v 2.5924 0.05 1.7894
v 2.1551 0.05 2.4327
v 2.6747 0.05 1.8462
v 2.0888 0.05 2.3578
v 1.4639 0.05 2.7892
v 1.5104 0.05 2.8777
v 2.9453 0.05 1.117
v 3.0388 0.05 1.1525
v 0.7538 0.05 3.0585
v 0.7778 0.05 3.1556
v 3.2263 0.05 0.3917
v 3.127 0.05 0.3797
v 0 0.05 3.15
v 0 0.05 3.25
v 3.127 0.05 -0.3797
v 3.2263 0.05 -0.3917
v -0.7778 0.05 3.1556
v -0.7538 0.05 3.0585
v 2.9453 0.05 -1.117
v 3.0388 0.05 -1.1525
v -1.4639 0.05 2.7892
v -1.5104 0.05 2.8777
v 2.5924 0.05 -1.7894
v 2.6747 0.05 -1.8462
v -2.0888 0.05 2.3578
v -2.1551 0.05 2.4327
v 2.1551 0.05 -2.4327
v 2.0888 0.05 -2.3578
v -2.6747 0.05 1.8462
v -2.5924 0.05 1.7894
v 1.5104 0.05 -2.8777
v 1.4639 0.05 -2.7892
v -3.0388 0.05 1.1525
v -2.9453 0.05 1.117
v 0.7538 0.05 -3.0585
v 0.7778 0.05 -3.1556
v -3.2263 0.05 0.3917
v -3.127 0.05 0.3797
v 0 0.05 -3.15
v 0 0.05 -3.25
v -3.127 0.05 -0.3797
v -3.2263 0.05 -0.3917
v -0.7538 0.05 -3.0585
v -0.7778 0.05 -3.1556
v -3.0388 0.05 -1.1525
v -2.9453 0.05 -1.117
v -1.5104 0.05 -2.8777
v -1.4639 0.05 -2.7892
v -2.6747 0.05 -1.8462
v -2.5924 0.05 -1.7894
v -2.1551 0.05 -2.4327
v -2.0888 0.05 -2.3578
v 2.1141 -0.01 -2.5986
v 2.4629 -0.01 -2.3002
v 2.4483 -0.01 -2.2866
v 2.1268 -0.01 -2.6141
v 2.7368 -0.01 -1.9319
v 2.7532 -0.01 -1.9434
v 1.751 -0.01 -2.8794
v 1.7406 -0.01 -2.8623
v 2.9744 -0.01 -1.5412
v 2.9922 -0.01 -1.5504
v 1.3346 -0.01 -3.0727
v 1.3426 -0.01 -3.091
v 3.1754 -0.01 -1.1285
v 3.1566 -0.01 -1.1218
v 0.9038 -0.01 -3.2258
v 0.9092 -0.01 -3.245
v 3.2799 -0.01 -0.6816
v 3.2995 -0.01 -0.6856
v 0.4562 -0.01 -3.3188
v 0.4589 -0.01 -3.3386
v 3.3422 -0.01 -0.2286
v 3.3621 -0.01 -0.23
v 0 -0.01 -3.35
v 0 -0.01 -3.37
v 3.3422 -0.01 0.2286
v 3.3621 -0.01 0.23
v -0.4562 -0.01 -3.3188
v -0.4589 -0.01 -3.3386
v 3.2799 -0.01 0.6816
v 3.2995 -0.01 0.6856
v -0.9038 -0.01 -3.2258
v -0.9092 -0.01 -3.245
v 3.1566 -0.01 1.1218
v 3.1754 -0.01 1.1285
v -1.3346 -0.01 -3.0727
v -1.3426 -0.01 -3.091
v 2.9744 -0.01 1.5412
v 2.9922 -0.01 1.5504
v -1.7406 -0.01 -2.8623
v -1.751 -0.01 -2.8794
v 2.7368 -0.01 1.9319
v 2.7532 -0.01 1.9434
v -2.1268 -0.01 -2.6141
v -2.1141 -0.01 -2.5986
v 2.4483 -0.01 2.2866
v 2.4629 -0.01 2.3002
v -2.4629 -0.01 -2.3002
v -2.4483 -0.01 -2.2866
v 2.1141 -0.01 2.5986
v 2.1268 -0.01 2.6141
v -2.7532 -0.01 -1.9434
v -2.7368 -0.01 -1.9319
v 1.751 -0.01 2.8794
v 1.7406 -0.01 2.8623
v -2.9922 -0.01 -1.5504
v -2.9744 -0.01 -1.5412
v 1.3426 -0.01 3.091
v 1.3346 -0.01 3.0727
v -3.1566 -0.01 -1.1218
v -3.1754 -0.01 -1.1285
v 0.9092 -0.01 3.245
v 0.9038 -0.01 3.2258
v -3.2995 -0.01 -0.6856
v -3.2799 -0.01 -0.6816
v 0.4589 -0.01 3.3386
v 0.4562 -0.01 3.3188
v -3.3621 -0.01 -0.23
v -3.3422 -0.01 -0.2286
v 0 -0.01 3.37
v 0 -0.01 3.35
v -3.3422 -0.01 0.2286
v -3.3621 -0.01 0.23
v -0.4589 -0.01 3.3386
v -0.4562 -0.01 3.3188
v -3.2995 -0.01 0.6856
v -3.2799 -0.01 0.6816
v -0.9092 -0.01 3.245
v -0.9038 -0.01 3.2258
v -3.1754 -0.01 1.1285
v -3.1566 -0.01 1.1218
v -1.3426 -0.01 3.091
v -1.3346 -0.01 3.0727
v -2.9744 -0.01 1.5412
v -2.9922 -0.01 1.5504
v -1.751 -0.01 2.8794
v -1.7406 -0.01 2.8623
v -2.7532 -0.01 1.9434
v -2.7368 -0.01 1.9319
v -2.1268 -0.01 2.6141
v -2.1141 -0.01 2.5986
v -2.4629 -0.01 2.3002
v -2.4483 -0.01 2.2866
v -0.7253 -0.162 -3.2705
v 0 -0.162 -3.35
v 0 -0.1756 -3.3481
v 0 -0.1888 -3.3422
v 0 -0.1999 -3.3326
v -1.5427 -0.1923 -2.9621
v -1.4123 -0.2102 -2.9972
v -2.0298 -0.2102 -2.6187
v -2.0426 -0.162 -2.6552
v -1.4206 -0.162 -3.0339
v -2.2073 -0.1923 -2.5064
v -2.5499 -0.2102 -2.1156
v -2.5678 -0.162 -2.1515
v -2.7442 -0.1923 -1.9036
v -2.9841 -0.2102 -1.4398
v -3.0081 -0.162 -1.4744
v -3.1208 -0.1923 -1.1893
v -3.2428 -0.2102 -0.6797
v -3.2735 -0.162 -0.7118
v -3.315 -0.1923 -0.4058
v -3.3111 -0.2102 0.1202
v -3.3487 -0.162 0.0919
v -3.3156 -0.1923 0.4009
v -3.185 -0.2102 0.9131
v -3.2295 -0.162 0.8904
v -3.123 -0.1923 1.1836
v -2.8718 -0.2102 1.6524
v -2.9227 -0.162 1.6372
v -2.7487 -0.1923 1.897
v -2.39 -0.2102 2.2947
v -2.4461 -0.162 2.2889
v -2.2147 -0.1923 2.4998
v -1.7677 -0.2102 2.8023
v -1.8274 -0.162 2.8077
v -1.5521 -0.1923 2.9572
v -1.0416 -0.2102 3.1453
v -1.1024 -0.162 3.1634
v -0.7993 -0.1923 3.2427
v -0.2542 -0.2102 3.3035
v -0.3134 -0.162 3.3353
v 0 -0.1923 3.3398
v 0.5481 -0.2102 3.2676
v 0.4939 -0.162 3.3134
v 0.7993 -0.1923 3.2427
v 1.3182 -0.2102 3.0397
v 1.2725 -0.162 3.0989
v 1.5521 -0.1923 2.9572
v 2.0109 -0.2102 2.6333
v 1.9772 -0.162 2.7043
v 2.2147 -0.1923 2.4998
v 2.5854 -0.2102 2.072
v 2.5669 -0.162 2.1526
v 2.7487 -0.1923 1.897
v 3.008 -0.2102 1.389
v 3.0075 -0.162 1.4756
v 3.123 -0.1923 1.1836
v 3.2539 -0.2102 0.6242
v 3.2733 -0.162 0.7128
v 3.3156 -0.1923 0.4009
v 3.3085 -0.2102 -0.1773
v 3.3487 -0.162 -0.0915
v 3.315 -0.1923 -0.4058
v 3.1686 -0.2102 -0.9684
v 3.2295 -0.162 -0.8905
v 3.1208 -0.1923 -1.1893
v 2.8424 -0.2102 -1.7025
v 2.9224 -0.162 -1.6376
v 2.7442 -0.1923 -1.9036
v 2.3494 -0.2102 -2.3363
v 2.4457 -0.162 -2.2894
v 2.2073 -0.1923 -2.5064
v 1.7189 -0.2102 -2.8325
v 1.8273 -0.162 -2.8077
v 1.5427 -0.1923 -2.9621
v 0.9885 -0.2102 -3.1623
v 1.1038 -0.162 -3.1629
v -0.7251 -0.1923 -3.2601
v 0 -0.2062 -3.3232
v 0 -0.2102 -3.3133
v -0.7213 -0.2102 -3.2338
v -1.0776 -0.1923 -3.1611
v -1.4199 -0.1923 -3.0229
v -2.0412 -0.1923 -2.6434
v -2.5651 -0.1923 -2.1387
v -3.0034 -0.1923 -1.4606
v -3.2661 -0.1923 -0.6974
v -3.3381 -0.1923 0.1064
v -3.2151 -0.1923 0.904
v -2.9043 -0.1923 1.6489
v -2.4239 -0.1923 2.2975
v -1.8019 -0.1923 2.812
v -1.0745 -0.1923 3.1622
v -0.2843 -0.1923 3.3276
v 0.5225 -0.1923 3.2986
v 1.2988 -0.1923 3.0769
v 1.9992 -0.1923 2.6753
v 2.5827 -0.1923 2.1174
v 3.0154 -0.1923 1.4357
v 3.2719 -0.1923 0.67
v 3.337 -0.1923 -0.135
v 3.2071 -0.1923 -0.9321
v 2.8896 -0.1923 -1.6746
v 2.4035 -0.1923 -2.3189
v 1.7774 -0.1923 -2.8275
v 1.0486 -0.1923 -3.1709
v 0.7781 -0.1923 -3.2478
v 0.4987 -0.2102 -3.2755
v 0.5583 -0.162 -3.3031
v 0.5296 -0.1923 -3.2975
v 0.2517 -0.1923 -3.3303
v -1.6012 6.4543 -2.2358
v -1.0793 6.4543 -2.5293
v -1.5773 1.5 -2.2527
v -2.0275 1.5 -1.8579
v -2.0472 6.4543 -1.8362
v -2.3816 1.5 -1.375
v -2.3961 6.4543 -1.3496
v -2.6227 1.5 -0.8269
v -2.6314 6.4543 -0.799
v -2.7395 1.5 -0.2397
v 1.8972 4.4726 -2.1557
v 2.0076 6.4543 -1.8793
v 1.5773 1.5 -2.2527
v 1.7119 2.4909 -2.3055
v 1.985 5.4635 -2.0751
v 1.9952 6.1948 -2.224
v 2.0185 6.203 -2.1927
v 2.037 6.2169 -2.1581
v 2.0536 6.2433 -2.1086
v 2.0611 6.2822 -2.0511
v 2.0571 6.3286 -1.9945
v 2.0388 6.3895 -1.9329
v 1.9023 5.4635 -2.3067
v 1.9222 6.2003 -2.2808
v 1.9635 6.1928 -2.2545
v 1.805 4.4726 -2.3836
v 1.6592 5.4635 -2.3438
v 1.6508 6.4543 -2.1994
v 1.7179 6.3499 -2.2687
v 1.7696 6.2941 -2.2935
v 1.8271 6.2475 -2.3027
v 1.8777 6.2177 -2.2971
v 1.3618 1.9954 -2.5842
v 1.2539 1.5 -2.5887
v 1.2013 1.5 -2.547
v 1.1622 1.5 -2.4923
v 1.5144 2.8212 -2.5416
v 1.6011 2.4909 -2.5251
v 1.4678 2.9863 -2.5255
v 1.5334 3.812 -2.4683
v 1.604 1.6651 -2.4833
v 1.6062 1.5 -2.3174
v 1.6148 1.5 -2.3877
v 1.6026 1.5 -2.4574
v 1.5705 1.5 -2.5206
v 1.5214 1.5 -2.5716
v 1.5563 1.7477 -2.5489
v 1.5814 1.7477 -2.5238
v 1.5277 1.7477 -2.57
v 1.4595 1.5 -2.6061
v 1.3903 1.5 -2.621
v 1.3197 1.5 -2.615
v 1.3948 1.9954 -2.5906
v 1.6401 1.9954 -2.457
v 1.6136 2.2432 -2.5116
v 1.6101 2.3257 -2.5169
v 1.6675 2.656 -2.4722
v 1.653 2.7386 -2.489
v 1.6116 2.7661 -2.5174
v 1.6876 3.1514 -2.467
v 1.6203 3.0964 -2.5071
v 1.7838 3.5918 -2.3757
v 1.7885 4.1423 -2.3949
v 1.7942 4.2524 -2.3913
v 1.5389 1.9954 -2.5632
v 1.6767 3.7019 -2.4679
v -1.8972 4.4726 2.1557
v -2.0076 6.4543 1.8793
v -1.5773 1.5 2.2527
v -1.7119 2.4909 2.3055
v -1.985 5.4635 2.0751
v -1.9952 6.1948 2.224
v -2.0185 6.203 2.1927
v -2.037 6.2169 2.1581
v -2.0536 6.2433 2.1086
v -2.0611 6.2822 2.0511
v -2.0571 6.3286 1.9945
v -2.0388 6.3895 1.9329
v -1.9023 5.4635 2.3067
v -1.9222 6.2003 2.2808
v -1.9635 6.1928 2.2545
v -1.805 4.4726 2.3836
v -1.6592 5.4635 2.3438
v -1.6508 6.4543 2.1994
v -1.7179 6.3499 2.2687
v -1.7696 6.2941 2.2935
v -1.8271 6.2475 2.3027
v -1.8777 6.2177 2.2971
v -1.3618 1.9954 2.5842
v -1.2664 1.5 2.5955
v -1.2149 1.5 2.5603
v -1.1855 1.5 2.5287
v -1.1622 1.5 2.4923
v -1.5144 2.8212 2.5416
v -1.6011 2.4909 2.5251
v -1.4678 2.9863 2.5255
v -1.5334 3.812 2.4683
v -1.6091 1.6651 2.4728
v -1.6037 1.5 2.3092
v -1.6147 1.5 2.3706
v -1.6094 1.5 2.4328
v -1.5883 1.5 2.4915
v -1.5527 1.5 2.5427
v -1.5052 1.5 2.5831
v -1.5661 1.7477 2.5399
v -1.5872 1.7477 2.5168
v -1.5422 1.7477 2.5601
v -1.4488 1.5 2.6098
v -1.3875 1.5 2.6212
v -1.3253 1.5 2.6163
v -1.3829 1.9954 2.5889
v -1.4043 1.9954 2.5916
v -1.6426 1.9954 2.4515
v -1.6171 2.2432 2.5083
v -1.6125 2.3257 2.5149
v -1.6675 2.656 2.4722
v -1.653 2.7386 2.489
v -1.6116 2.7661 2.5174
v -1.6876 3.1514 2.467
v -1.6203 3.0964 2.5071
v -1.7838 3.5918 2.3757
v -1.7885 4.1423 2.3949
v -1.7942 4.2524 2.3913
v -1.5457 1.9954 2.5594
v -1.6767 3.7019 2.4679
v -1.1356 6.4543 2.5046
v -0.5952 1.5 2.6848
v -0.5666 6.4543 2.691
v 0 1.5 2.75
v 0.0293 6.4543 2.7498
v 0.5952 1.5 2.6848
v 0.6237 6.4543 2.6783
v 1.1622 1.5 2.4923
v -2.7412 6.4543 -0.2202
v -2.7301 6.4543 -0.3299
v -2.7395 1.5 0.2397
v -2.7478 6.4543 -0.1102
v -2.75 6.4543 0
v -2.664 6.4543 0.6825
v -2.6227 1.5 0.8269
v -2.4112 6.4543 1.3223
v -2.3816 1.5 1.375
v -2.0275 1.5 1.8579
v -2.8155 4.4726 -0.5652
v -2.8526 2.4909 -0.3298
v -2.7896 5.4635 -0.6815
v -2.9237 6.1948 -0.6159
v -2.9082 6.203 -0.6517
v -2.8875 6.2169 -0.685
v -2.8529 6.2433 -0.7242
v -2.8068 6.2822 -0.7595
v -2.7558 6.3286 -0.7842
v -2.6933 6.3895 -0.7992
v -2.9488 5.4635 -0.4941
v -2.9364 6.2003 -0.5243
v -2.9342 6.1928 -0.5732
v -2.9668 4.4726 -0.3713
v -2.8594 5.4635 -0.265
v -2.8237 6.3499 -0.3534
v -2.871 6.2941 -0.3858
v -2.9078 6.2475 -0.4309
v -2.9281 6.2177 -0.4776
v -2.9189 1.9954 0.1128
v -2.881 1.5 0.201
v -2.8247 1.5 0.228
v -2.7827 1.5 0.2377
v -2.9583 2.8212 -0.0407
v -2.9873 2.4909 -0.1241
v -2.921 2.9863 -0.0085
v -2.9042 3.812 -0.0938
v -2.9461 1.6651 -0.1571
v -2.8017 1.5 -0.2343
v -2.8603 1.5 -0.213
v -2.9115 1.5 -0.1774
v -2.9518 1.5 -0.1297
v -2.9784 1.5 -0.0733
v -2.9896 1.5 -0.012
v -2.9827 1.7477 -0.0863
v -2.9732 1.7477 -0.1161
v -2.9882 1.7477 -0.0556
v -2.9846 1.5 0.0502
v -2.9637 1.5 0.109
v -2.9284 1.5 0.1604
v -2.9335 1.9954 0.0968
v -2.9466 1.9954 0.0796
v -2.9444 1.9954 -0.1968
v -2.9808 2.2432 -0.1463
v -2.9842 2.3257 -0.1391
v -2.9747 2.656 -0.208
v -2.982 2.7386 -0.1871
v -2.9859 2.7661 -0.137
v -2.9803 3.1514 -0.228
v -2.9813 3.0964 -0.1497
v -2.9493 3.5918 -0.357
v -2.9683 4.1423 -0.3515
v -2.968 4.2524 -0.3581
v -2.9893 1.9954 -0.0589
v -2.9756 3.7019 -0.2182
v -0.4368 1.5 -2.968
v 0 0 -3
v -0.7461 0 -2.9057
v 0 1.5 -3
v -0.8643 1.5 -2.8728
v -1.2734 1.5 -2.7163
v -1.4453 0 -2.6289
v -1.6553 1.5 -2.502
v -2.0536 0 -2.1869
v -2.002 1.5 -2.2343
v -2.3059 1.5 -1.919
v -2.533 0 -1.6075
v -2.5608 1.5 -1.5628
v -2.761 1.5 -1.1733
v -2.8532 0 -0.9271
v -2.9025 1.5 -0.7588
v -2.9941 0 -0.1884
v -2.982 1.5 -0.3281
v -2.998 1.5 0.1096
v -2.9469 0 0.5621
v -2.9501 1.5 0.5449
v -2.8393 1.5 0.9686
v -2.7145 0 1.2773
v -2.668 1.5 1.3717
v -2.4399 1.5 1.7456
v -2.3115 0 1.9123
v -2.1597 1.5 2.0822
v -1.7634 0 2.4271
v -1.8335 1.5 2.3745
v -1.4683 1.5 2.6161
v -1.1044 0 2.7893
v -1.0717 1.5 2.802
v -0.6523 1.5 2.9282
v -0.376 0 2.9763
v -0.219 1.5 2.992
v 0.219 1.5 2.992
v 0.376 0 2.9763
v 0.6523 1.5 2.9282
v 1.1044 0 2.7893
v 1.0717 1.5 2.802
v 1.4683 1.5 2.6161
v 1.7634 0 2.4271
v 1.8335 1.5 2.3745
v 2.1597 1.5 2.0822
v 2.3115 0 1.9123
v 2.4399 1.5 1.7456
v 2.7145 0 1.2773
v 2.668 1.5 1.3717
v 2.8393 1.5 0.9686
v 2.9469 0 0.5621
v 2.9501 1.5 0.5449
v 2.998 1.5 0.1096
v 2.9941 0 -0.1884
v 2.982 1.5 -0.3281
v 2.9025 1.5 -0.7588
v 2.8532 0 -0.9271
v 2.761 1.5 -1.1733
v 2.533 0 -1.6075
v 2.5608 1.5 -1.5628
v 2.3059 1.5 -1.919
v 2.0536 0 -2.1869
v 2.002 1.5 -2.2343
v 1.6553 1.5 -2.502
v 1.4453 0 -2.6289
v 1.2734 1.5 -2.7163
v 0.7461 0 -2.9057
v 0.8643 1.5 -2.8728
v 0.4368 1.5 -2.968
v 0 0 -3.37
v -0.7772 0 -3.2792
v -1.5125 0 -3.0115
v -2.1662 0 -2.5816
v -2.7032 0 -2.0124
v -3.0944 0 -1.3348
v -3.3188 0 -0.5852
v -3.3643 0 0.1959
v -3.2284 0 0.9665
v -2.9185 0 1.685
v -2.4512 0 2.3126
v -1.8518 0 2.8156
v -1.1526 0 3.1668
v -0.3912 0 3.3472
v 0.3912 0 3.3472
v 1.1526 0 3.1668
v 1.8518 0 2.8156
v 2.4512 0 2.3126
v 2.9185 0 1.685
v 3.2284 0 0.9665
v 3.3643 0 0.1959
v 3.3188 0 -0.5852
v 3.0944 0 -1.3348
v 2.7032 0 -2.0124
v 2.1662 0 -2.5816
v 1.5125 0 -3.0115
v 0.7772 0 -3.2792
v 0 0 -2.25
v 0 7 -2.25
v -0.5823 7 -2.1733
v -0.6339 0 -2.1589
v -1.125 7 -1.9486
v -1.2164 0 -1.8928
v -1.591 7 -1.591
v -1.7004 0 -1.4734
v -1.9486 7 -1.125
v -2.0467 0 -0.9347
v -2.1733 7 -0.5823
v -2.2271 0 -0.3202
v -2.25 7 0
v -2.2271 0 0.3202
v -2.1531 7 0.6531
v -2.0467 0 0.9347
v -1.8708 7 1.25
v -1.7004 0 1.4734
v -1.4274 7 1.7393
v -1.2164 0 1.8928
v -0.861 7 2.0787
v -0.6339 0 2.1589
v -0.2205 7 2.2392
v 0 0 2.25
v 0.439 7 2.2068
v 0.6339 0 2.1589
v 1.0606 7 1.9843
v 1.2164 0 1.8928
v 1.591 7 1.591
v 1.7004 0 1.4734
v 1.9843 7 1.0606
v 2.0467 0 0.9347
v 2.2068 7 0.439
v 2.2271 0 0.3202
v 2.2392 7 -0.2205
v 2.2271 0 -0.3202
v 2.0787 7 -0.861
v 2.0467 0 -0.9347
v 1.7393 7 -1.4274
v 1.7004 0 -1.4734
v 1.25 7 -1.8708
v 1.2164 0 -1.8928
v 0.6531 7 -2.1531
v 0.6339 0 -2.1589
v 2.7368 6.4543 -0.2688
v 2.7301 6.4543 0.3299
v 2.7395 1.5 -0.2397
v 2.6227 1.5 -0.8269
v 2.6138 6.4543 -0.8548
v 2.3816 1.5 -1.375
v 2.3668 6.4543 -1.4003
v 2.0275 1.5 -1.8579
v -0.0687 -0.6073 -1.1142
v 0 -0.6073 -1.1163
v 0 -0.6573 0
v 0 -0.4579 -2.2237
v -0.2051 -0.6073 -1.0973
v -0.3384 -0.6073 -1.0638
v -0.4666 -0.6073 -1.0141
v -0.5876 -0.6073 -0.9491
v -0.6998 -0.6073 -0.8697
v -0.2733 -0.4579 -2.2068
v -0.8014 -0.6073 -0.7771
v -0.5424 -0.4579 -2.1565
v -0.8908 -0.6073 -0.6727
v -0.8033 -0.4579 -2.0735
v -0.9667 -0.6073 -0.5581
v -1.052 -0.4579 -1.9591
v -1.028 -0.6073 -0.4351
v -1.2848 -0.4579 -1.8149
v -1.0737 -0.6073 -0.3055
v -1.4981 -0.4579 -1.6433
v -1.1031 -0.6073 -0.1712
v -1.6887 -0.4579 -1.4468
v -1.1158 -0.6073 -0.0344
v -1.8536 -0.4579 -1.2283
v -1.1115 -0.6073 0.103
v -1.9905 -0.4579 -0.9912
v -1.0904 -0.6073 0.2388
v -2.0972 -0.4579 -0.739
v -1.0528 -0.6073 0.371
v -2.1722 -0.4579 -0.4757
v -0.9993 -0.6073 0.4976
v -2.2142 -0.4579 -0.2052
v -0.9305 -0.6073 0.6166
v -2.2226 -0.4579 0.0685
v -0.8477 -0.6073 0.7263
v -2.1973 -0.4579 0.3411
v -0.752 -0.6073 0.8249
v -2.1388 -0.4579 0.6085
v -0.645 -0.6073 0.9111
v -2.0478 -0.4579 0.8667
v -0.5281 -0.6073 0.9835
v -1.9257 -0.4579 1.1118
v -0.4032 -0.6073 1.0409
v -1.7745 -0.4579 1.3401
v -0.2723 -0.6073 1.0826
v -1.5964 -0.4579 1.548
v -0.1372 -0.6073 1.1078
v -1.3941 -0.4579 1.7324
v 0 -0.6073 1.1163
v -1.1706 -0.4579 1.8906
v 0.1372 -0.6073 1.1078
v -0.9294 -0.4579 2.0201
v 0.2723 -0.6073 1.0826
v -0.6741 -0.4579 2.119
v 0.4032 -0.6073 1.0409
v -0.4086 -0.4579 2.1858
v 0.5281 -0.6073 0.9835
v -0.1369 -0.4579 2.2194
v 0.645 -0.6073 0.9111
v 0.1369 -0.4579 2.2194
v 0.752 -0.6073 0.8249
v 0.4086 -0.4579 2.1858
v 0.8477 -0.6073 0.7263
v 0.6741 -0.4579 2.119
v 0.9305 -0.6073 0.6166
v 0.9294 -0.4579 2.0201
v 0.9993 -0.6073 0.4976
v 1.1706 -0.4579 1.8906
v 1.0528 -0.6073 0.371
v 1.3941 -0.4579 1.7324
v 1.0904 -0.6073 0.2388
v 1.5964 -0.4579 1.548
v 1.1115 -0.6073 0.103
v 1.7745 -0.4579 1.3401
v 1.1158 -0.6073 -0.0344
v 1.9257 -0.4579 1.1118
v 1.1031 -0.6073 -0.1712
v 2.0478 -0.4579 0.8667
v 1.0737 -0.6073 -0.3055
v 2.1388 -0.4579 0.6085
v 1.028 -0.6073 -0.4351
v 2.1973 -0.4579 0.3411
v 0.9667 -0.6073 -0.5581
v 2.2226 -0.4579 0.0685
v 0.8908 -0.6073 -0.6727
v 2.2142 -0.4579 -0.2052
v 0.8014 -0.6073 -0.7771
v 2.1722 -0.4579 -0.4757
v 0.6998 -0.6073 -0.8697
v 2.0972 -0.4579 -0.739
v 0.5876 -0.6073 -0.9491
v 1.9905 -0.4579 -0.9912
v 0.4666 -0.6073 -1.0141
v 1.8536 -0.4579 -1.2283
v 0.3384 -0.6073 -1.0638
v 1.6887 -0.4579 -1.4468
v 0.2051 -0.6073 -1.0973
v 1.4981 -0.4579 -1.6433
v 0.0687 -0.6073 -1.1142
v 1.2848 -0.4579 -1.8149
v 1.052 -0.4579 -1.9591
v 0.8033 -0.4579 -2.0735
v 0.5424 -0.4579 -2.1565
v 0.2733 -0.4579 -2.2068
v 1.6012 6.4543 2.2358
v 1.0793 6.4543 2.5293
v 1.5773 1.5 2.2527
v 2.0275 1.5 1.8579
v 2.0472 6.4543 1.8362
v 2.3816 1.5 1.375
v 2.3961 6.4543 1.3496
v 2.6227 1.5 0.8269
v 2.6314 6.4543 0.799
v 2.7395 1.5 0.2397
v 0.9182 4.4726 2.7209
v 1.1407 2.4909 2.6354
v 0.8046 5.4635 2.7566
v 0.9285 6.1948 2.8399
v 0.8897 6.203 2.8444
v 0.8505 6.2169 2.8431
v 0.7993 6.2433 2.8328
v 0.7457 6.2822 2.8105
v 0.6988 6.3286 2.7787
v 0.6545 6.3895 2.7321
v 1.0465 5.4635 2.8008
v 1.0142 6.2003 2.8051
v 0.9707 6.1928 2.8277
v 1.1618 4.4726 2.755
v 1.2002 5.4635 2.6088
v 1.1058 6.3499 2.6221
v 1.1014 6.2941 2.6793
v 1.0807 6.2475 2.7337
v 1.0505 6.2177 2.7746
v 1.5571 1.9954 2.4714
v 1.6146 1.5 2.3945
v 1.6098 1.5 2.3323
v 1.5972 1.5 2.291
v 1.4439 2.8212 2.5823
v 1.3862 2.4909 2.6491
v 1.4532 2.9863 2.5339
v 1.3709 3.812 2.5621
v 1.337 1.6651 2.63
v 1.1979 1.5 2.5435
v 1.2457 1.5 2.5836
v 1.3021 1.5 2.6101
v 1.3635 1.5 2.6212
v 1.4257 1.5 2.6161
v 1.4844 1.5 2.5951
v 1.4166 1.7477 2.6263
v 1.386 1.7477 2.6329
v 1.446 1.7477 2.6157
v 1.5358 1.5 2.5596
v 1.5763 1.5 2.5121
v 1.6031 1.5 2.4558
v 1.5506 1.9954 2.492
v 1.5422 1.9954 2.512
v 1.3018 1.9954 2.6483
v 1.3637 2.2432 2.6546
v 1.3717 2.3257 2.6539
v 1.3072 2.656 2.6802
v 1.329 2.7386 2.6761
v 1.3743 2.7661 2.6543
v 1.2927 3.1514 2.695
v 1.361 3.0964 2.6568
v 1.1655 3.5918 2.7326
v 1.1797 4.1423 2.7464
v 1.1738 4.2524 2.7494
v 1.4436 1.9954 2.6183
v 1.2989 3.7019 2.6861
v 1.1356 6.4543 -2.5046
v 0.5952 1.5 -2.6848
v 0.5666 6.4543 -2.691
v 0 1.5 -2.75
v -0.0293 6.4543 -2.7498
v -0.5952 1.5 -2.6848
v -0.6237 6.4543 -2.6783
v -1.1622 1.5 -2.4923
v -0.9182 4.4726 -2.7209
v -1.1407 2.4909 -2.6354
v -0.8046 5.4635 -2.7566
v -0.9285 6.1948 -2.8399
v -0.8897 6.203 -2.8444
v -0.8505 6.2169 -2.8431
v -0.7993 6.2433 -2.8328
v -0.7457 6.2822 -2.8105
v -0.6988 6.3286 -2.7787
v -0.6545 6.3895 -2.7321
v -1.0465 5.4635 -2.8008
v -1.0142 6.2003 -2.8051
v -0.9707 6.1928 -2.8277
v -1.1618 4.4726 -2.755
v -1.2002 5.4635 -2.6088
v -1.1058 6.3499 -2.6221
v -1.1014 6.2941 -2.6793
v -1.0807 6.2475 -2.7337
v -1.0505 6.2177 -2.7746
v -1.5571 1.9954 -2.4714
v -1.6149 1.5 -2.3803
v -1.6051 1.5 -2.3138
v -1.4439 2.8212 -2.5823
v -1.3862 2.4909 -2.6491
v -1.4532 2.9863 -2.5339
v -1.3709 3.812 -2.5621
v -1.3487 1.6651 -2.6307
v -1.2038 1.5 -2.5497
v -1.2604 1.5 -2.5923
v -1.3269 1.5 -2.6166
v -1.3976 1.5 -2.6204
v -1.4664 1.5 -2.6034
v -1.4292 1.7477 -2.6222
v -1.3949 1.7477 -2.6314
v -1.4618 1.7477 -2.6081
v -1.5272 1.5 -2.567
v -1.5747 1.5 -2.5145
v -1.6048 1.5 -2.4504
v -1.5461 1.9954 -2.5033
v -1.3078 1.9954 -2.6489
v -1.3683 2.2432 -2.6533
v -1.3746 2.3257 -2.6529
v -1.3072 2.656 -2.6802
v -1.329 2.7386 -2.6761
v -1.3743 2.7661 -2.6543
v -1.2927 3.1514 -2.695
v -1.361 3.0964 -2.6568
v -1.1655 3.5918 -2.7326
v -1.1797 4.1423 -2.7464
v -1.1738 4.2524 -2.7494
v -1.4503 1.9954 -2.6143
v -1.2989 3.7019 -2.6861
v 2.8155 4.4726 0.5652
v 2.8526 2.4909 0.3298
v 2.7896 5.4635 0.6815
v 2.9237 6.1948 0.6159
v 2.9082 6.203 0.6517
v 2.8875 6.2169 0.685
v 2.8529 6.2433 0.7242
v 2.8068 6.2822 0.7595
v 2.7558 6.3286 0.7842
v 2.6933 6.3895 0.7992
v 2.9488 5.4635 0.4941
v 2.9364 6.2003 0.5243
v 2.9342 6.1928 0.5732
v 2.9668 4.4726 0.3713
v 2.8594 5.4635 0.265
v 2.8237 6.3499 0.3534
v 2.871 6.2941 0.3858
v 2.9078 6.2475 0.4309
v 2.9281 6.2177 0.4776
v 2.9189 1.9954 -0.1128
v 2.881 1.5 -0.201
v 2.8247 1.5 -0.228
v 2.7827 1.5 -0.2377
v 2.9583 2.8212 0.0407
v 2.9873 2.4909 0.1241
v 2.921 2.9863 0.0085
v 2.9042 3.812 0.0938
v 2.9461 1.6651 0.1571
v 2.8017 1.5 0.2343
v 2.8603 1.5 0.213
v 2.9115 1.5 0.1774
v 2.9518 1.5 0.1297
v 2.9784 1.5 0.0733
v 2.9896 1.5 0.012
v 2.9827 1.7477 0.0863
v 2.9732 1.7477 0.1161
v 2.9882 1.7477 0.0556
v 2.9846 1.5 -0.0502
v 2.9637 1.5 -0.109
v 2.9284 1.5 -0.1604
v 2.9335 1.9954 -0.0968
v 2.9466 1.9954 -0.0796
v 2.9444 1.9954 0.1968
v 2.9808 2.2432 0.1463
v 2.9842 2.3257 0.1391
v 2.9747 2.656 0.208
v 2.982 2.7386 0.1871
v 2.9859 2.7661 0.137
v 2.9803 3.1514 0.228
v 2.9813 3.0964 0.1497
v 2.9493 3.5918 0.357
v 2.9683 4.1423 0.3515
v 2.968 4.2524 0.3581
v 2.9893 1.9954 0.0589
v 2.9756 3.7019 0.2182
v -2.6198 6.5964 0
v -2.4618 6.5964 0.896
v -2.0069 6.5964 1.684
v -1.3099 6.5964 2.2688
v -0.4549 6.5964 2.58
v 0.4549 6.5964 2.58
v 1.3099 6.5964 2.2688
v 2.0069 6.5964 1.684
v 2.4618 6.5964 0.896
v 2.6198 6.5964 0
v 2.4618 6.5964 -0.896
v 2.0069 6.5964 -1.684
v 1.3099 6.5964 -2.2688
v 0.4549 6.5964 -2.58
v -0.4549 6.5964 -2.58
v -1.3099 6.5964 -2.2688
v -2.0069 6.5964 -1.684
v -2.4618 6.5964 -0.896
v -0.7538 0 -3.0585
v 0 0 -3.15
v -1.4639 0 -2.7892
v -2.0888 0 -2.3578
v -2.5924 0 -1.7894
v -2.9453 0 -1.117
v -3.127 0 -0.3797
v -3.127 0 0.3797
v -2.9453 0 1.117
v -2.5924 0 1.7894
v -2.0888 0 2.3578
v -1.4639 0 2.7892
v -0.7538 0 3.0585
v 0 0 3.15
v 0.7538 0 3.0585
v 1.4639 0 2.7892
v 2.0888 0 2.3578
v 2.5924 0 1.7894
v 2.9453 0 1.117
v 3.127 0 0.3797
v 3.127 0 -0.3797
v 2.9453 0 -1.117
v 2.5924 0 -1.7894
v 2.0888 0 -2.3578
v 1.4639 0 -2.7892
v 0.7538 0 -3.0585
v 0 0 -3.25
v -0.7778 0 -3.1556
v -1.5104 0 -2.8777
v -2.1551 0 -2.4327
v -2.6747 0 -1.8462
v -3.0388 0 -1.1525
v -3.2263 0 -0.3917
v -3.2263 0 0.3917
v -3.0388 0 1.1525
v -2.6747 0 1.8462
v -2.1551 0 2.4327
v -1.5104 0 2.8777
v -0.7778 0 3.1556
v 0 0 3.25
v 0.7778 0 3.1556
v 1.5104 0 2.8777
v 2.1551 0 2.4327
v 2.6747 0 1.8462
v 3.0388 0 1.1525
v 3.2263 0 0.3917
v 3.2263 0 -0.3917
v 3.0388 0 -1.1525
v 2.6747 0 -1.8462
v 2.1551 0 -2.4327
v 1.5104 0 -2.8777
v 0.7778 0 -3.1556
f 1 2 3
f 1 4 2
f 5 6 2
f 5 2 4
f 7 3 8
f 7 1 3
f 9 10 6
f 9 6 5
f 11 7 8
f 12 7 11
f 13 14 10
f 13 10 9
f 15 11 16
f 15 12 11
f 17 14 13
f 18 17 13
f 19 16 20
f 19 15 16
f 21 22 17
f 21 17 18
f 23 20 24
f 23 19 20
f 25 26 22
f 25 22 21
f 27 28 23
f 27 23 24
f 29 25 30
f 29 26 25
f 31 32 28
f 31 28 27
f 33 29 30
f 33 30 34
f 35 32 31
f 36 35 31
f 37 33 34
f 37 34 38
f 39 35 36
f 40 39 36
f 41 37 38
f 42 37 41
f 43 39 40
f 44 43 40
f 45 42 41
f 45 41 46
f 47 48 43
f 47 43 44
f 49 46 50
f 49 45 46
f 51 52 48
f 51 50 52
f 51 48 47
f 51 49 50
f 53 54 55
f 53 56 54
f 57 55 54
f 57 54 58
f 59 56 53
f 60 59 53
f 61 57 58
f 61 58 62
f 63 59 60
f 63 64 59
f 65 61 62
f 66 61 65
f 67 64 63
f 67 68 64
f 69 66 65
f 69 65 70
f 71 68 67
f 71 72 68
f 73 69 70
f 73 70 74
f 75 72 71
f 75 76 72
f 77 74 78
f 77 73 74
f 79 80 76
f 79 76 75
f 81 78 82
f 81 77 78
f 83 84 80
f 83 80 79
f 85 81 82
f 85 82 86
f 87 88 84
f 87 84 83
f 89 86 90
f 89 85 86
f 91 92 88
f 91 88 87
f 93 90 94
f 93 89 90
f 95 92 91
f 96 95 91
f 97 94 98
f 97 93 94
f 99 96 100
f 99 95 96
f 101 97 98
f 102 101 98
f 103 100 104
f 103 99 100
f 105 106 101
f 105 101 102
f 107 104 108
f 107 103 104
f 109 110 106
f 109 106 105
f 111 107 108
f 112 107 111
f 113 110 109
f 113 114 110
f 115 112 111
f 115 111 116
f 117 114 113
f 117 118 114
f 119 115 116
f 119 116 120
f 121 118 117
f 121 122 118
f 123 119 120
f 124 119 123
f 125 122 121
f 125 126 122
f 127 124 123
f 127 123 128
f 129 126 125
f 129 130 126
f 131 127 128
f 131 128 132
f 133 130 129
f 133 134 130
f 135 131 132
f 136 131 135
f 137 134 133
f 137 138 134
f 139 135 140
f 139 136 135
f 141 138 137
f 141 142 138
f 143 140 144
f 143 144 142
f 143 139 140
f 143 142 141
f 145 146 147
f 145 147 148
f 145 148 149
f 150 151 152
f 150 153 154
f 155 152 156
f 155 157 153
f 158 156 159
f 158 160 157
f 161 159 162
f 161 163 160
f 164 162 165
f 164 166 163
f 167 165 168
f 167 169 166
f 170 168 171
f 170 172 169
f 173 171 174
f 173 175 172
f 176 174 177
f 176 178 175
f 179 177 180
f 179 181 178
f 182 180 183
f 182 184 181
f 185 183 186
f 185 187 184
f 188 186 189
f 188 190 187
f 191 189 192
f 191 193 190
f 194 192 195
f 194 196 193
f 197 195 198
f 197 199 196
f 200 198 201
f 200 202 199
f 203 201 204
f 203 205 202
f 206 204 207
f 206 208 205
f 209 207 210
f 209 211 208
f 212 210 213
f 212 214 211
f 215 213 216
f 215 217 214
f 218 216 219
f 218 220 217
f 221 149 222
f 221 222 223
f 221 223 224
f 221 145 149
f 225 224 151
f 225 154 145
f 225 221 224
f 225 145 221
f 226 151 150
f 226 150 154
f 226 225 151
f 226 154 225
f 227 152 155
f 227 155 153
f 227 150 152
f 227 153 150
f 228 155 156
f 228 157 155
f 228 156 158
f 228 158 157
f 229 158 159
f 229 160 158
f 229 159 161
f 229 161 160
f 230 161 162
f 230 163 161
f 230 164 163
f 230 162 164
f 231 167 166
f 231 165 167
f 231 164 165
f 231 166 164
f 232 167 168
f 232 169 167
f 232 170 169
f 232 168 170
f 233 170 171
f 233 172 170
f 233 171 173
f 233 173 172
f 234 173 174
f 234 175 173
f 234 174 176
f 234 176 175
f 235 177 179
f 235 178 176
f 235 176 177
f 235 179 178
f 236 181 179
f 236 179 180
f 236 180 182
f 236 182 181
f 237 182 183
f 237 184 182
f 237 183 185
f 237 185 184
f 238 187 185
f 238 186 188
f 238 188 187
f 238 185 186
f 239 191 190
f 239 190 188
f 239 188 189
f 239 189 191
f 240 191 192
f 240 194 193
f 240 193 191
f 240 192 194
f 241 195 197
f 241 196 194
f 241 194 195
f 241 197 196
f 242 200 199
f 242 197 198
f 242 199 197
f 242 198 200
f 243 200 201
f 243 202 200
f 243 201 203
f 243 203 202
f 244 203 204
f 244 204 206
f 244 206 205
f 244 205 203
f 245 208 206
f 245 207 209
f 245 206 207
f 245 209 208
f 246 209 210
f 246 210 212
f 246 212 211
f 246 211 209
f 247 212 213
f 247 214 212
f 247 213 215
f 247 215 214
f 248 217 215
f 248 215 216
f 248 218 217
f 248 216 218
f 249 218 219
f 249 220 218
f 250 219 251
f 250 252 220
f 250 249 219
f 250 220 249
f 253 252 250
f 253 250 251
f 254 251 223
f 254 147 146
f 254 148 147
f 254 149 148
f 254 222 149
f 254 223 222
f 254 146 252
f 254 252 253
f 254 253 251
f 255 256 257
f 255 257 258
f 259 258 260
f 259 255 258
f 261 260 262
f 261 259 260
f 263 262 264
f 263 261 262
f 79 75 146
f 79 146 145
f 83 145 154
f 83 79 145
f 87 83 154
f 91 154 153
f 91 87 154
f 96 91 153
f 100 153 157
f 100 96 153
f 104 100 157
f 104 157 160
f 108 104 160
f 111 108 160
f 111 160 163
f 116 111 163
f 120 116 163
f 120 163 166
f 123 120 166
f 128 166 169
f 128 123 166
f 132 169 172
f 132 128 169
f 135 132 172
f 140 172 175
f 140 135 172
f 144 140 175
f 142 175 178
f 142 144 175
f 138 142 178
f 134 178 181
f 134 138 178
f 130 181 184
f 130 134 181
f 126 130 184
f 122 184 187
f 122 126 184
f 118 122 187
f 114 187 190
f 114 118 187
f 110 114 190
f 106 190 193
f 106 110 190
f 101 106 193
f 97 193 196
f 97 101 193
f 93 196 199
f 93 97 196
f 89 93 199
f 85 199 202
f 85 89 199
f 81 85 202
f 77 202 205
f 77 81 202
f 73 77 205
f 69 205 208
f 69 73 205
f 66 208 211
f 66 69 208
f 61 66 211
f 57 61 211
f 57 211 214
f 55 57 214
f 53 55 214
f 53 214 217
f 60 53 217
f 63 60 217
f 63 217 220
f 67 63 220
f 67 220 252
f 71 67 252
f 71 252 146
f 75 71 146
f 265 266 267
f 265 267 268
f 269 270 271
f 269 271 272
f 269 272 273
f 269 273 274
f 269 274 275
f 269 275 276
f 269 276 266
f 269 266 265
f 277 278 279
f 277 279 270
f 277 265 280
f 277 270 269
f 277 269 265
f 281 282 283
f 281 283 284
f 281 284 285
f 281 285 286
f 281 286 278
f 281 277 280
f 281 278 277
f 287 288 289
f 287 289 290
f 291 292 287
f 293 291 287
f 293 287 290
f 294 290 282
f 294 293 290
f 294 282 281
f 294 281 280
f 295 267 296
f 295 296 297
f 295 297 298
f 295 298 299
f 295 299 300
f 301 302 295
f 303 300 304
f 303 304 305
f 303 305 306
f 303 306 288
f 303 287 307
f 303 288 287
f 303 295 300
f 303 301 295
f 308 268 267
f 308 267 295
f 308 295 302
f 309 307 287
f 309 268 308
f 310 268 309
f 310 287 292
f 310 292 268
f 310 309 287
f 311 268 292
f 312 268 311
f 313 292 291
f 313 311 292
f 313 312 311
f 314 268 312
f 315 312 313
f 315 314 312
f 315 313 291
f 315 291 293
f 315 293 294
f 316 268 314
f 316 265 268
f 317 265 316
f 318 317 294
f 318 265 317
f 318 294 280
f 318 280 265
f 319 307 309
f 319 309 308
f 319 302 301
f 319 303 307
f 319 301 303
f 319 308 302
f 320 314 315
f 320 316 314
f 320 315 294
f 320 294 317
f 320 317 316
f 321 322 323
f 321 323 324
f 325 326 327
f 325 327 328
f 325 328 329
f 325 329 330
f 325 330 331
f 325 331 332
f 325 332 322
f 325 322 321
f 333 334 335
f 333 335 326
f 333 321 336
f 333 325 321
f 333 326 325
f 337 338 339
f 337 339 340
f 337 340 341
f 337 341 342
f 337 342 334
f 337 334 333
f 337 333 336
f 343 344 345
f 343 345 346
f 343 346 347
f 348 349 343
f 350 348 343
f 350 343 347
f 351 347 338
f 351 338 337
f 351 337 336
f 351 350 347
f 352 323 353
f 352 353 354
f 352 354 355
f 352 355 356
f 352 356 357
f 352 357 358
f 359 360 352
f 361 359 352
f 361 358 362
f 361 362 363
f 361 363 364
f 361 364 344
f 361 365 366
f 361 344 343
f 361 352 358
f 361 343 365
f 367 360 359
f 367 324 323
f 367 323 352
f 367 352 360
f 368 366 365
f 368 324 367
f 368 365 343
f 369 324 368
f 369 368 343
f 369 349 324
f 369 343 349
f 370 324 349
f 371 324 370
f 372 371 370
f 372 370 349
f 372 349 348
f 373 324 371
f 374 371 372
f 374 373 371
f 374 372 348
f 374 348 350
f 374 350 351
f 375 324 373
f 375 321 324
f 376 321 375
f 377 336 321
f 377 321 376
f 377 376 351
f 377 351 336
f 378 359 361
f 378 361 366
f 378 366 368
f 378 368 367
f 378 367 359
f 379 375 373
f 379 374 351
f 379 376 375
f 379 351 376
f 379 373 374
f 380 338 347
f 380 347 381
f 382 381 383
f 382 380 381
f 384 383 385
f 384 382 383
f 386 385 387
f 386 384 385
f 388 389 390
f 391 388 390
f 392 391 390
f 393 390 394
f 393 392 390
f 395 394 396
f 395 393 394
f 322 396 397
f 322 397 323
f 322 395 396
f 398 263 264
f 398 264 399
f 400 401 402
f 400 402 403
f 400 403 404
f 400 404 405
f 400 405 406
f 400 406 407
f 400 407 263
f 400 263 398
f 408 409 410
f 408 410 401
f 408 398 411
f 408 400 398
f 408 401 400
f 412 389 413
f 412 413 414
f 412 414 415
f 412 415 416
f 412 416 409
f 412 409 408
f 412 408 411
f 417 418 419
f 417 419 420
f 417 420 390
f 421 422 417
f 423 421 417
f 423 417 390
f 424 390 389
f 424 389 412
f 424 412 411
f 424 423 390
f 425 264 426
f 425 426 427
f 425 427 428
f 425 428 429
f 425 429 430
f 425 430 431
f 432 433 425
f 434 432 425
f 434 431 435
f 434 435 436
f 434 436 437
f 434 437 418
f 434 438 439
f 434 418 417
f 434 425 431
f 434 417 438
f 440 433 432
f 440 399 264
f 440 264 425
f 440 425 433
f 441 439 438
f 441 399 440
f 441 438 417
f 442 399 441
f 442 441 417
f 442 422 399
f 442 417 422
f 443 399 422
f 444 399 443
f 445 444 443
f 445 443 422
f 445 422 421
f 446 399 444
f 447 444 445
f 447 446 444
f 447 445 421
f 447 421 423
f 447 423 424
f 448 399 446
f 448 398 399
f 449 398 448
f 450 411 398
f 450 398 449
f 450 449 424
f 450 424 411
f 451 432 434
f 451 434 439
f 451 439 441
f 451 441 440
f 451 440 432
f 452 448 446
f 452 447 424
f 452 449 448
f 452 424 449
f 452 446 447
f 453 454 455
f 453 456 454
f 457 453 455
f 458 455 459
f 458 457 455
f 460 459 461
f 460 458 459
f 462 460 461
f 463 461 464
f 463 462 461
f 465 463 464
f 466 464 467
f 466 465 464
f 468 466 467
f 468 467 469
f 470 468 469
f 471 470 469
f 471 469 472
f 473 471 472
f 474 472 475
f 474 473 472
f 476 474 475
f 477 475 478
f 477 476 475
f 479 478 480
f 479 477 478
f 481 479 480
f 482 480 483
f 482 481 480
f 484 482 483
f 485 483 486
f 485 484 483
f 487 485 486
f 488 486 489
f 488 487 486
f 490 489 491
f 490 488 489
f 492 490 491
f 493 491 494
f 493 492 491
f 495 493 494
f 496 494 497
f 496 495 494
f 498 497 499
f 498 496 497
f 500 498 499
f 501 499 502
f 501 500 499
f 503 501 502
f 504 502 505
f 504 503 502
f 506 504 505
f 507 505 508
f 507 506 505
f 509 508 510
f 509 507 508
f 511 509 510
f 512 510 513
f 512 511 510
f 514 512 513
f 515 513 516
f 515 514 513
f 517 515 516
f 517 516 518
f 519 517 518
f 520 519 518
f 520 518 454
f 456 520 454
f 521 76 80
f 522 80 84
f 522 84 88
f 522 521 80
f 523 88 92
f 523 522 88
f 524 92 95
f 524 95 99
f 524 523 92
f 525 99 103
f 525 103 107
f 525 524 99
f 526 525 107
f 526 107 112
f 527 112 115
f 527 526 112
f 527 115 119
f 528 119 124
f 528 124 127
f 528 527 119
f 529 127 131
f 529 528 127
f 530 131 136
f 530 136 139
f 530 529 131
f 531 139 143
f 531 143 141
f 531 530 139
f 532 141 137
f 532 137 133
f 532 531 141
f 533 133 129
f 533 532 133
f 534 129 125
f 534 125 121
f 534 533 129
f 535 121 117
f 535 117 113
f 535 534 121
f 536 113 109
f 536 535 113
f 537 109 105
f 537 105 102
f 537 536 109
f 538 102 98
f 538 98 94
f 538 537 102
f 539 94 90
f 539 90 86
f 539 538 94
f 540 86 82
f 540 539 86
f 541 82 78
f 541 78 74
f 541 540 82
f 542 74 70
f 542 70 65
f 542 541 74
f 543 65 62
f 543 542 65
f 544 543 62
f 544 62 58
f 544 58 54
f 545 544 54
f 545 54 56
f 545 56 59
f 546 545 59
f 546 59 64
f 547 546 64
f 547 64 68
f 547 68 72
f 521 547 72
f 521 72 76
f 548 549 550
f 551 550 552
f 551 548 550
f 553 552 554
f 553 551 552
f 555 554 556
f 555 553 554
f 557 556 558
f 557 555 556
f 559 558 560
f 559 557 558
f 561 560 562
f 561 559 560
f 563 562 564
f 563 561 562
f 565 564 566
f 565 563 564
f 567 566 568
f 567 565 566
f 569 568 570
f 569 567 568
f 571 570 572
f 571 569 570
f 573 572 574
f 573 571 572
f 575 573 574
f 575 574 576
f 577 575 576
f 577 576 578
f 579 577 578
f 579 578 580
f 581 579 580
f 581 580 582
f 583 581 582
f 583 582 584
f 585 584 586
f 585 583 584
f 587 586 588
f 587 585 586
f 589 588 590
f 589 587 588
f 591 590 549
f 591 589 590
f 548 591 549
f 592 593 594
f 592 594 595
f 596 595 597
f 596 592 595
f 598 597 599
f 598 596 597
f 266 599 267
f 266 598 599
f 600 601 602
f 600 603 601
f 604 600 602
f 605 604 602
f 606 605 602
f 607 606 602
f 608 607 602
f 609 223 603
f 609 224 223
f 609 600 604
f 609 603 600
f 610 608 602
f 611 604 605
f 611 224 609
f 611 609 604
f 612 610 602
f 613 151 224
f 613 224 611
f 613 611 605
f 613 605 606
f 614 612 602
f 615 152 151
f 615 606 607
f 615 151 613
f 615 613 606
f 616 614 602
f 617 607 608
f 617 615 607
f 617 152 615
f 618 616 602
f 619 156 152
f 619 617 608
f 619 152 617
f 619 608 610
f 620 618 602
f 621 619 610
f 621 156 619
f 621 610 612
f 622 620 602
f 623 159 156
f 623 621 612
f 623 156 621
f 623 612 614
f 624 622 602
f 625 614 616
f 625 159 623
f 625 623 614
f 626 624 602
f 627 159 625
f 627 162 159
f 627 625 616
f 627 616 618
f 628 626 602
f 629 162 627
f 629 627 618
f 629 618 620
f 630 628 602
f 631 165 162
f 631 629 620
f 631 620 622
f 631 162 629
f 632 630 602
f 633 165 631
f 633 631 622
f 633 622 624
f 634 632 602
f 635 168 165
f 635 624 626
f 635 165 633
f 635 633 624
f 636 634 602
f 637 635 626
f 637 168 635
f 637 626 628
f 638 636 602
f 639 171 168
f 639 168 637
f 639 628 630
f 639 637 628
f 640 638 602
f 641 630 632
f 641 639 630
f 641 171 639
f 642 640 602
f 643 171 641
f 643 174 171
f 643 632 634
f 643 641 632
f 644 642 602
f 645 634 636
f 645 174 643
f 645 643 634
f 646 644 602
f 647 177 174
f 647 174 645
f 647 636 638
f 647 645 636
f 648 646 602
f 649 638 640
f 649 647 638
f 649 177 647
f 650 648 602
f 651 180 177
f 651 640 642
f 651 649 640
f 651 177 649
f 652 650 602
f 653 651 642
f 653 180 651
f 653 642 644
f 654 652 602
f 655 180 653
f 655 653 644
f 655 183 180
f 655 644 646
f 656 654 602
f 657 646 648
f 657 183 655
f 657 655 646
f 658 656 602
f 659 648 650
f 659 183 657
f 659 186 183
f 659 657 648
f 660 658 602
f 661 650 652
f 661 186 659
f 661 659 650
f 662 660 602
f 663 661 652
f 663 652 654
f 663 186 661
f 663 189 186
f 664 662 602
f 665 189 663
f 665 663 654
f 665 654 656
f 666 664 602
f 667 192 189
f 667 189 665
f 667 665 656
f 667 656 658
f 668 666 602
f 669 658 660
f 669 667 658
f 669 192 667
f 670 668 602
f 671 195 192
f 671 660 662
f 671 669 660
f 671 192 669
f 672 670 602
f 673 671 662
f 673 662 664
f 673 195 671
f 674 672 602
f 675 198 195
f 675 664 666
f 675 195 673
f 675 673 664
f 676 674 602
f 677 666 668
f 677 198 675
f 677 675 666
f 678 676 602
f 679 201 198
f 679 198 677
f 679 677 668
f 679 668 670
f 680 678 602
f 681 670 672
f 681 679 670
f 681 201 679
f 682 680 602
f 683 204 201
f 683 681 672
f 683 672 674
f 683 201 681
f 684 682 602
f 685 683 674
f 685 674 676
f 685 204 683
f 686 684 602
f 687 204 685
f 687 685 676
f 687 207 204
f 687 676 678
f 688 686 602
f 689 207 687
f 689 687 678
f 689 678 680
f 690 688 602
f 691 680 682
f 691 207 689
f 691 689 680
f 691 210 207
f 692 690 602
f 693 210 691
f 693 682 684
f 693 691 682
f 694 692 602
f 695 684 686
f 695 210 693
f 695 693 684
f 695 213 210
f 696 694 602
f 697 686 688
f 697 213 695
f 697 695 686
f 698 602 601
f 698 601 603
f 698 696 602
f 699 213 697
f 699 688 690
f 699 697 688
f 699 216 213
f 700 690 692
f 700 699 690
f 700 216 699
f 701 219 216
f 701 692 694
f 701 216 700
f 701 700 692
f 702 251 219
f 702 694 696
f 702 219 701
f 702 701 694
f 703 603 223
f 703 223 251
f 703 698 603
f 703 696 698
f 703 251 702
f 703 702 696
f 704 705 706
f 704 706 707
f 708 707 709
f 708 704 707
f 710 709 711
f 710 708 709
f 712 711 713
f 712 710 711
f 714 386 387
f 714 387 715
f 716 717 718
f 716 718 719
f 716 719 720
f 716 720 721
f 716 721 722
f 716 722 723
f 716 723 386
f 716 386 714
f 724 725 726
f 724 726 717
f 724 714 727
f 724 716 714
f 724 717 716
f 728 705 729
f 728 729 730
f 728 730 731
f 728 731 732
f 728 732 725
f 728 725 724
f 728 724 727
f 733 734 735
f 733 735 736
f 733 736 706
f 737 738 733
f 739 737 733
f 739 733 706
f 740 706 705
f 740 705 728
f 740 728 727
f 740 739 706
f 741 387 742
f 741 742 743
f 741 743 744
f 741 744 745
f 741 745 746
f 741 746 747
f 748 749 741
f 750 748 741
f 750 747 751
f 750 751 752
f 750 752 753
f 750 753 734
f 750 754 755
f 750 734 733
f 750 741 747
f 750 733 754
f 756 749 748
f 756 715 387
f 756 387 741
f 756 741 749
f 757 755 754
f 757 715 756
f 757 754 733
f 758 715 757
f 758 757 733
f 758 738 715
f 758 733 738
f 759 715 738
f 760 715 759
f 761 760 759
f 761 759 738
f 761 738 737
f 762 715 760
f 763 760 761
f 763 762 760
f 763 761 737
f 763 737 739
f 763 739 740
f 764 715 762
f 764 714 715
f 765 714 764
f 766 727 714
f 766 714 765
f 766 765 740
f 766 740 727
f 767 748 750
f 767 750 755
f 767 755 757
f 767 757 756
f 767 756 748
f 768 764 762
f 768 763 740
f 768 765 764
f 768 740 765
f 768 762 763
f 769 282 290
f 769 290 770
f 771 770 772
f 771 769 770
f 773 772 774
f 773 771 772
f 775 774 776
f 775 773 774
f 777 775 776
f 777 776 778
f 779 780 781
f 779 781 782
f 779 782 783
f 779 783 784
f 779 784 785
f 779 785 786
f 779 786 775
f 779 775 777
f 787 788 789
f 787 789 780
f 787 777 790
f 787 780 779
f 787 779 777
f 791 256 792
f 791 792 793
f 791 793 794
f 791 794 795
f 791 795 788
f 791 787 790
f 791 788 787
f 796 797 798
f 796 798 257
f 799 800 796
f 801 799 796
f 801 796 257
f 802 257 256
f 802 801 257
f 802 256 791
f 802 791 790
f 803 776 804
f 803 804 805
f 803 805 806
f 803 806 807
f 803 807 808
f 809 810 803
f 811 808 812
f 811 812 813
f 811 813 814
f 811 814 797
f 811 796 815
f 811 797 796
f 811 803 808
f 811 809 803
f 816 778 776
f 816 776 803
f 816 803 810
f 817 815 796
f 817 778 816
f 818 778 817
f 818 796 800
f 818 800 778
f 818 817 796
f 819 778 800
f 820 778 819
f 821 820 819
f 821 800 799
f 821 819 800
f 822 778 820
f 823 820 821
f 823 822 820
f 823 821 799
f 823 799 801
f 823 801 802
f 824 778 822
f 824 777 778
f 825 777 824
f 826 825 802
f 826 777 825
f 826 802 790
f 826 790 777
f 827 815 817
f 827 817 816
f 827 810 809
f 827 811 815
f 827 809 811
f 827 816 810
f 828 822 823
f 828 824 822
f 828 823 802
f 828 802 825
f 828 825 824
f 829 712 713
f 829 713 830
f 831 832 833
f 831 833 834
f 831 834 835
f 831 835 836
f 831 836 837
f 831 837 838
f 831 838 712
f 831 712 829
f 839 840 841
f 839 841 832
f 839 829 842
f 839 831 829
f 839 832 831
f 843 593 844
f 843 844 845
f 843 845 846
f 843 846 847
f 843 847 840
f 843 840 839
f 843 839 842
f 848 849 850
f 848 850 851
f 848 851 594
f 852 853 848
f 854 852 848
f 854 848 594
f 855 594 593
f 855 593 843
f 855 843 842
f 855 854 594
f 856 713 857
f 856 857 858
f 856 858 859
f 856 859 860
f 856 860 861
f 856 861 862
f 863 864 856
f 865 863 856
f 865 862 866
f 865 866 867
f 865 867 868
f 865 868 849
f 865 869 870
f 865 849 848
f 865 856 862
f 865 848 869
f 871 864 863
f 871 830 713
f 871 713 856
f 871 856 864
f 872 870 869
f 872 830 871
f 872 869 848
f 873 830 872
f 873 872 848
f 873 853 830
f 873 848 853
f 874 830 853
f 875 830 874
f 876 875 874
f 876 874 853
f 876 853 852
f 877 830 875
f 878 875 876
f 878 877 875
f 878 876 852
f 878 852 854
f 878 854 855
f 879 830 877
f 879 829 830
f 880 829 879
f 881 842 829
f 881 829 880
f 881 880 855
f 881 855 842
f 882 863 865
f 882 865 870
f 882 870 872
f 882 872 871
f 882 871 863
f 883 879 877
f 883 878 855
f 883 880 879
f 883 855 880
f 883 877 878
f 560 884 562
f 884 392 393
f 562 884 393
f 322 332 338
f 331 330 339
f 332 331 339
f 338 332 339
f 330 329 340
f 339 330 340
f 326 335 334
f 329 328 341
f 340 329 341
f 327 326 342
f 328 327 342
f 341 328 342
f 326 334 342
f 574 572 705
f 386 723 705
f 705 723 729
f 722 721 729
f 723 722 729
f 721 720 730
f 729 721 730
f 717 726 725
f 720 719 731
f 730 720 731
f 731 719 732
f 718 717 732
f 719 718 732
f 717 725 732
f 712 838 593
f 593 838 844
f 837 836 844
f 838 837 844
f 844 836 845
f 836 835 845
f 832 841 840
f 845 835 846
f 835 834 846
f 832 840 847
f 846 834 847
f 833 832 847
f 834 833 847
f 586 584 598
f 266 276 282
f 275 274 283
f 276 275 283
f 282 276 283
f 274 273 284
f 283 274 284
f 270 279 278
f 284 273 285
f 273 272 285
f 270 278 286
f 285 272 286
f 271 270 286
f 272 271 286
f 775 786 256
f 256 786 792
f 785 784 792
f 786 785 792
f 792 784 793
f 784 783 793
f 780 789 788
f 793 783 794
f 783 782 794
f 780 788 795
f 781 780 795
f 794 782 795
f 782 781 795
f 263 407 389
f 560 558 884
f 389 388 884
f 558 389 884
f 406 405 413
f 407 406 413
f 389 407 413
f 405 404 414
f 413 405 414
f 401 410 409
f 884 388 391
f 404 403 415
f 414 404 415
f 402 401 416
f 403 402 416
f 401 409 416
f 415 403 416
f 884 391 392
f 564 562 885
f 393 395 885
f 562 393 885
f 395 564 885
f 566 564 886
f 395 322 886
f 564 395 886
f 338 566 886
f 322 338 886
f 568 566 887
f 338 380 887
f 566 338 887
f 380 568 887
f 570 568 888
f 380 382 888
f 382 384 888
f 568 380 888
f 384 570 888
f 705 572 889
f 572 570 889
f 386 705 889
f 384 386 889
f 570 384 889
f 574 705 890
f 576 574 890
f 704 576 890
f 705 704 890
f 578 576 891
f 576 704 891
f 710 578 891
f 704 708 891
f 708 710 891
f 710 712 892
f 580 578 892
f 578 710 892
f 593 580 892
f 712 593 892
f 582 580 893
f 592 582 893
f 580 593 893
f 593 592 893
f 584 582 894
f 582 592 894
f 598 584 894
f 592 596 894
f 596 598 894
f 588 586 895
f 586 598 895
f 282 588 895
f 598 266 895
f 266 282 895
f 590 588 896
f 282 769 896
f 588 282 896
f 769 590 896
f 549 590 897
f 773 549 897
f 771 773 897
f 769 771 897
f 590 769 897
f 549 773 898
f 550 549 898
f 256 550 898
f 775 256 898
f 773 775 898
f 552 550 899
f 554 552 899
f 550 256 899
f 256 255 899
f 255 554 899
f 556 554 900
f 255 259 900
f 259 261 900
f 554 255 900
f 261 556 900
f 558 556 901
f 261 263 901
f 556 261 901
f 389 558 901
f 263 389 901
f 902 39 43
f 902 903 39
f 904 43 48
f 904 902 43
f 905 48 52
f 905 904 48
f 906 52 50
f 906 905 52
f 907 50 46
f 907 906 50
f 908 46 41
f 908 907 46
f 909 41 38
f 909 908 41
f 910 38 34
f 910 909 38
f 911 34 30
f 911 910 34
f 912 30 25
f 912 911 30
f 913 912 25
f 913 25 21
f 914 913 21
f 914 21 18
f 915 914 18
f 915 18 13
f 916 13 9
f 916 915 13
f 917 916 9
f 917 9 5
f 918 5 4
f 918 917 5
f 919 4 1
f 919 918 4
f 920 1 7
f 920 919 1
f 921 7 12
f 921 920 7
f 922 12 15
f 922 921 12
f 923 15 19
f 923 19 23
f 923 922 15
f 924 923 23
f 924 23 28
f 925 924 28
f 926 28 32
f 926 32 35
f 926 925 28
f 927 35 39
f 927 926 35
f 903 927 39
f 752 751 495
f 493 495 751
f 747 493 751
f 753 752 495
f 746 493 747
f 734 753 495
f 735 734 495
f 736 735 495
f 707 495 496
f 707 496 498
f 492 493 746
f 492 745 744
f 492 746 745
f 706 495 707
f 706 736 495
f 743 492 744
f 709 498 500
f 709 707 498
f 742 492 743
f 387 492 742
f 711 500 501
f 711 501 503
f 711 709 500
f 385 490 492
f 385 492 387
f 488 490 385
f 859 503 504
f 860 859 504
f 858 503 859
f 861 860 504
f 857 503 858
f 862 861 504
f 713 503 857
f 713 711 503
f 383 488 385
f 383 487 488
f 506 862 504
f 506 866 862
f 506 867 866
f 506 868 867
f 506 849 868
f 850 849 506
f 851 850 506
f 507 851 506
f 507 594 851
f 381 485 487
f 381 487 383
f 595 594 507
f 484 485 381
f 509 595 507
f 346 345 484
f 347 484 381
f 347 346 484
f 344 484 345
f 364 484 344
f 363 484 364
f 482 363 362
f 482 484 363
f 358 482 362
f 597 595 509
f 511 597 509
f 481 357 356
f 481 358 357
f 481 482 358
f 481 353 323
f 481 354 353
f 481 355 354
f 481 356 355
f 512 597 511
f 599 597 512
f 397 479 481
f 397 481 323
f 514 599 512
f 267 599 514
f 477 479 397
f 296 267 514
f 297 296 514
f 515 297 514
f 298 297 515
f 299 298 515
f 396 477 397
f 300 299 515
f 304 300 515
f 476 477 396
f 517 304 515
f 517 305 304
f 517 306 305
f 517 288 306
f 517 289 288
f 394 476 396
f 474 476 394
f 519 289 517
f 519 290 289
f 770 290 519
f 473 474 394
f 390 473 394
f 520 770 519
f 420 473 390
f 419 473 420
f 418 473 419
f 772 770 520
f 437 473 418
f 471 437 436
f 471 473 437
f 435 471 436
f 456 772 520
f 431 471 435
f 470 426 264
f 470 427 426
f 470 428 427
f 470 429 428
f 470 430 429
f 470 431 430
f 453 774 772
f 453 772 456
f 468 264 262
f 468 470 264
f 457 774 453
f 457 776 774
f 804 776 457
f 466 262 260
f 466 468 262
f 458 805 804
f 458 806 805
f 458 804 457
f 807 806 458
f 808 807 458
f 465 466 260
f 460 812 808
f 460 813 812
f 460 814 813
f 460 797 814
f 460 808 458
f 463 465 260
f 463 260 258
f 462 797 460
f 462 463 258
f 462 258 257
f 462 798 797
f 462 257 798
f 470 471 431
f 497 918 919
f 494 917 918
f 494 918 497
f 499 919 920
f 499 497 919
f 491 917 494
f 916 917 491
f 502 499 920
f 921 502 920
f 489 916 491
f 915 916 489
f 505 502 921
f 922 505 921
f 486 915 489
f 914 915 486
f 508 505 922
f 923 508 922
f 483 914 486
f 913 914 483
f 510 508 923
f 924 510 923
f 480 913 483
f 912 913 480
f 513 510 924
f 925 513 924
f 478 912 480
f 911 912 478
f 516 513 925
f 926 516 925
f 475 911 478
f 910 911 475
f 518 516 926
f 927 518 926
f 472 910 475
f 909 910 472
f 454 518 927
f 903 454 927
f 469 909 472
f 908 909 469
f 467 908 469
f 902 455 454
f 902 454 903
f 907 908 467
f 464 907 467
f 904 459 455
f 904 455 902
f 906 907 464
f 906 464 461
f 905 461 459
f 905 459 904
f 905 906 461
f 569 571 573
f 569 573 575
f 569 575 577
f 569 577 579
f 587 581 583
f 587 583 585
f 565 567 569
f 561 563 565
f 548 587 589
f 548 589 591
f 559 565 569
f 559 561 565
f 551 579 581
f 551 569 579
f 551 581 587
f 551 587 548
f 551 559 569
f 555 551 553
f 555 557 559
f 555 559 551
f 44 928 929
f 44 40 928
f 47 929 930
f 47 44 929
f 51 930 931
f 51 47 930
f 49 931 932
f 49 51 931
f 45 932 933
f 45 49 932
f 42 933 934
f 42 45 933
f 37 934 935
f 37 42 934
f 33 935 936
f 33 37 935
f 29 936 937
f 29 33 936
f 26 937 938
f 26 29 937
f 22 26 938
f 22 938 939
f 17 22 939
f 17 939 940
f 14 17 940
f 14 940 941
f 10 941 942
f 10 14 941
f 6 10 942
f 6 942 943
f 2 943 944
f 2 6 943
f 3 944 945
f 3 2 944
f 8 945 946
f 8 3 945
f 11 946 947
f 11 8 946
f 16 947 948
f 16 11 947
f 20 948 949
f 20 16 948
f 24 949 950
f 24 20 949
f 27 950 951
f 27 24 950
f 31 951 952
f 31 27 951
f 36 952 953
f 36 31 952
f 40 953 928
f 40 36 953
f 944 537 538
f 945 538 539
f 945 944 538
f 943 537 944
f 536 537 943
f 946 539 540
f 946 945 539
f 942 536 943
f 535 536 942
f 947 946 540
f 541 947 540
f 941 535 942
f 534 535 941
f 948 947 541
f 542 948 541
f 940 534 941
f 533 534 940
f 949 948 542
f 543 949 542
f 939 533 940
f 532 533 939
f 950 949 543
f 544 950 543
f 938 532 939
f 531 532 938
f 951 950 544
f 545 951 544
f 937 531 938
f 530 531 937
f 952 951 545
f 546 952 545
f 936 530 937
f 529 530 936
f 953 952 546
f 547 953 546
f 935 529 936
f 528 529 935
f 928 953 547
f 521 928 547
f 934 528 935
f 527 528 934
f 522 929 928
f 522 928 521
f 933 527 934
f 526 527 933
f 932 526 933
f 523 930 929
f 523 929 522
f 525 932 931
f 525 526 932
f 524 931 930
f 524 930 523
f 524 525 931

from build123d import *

# Parameters (mm, degrees)
BARRER1_PITCH       = 150
BARRER1_HEIGHT      = 5
BARRER1_RADIUS      = 2.75
BARRER1_START_ANGLE = 90
MATRIZC1_COUNT      = 6
REDONDEO1_R         = 0.05


with BuildPart() as part:
    # Croquis1 → Revolución1 (revolve)
    with BuildSketch(Plane.XY, mode=Mode.PRIVATE) as revoluci_n1_sk:
        with BuildLine():
            Line((2.25, 0), (0, 0))
            Line((0, 0), (0, -0.6572636))
            ThreePointArc((0, -0.6572636), (1.690531721, -0.542420139), (3.35, -0.2))
            Line((3.35, -0.2), (3.35, -0.01))
            Line((3.35, -0.01), (3.37, -0.01))
            Line((3.37, -0.01), (3.37, 0))
            Line((3.37, 0), (3.25, 0))
            Line((3.25, 0), (3.25, 0.05))
            Line((3.25, 0.05), (3.15, 0.05))
            Line((3.15, 0.05), (3.15, 0))
            Line((3.15, 0), (3, 0))
            Line((3, 0), (3, 1.5))
            Line((3, 1.5), (2.75, 1.5))
            Line((2.75, 1.5), (2.75, 7))
            Line((2.75, 7), (2.25, 7))
            Line((2.25, 7), (2.25, 0))
        make_face()
    revolve(revoluci_n1_sk.sketch.rotate(Axis((0, 0, 0), (0, 1, 0)), 90), axis=Axis((0, 0, 0), (0, 1, 0)))

    # Barrer1: sweep along a helix
    with BuildLine() as barrer1_path:
        add(Helix(BARRER1_PITCH, BARRER1_HEIGHT, BARRER1_RADIUS, center=(0, 1.5, 0), direction=(0, 1, 0), lefthand=True, mode=Mode.PRIVATE).rotate(Axis((0, 1.5, 0), (0, 1, 0)), BARRER1_START_ANGLE))
    # Croquis2 → Barrer1 (sweep)
    with BuildSketch(Plane(origin=(0, 1.5, 0), x_dir=(1, 0, 0), z_dir=(0, 1, 0))):
        with BuildLine():
            ThreePointArc((2.73953542, -0.239678293), (2.989906631, 0), (2.73953542, 0.239678293))
            ThreePointArc((2.73953542, 0.239678293), (2.75, 0), (2.73953542, -0.239678293))
        make_face()
    barrer1 = sweep(path=barrer1_path.line, is_frenet=True)

    # MatrizC1: Barrer1 ×6 about axis
    matrizc1_axis = Axis((0, 7, 0), (0, -1, 0))
    for i in range(1, MATRIZC1_COUNT):
        add(barrer1.rotate(matrizc1_axis, i * 360 / MATRIZC1_COUNT))

    # Redondeo1
    redondeo1_edges = [part.edges().sort_by_distance(p)[0] for p in [
        (0, -0.2, 3.35),
    ]]
    fillet(redondeo1_edges, radius=REDONDEO1_R)

    # Croquis7 → Cortar-Revolución1 (revolve, cut)
    with BuildSketch(Plane.XY, mode=Mode.PRIVATE) as cortar_revoluci_n1_sk:
        Polygon((2.25, 7), (3.437132412, 5.704472307), (3.437132412, 7), align=None)
    revolve(cortar_revoluci_n1_sk.sketch.rotate(Axis((0, 0, 0), (0, 1, 0)), 180), axis=Axis((0, 0, 0), (0, 1, 0)), mode=Mode.SUBTRACT)


solid = part.part
